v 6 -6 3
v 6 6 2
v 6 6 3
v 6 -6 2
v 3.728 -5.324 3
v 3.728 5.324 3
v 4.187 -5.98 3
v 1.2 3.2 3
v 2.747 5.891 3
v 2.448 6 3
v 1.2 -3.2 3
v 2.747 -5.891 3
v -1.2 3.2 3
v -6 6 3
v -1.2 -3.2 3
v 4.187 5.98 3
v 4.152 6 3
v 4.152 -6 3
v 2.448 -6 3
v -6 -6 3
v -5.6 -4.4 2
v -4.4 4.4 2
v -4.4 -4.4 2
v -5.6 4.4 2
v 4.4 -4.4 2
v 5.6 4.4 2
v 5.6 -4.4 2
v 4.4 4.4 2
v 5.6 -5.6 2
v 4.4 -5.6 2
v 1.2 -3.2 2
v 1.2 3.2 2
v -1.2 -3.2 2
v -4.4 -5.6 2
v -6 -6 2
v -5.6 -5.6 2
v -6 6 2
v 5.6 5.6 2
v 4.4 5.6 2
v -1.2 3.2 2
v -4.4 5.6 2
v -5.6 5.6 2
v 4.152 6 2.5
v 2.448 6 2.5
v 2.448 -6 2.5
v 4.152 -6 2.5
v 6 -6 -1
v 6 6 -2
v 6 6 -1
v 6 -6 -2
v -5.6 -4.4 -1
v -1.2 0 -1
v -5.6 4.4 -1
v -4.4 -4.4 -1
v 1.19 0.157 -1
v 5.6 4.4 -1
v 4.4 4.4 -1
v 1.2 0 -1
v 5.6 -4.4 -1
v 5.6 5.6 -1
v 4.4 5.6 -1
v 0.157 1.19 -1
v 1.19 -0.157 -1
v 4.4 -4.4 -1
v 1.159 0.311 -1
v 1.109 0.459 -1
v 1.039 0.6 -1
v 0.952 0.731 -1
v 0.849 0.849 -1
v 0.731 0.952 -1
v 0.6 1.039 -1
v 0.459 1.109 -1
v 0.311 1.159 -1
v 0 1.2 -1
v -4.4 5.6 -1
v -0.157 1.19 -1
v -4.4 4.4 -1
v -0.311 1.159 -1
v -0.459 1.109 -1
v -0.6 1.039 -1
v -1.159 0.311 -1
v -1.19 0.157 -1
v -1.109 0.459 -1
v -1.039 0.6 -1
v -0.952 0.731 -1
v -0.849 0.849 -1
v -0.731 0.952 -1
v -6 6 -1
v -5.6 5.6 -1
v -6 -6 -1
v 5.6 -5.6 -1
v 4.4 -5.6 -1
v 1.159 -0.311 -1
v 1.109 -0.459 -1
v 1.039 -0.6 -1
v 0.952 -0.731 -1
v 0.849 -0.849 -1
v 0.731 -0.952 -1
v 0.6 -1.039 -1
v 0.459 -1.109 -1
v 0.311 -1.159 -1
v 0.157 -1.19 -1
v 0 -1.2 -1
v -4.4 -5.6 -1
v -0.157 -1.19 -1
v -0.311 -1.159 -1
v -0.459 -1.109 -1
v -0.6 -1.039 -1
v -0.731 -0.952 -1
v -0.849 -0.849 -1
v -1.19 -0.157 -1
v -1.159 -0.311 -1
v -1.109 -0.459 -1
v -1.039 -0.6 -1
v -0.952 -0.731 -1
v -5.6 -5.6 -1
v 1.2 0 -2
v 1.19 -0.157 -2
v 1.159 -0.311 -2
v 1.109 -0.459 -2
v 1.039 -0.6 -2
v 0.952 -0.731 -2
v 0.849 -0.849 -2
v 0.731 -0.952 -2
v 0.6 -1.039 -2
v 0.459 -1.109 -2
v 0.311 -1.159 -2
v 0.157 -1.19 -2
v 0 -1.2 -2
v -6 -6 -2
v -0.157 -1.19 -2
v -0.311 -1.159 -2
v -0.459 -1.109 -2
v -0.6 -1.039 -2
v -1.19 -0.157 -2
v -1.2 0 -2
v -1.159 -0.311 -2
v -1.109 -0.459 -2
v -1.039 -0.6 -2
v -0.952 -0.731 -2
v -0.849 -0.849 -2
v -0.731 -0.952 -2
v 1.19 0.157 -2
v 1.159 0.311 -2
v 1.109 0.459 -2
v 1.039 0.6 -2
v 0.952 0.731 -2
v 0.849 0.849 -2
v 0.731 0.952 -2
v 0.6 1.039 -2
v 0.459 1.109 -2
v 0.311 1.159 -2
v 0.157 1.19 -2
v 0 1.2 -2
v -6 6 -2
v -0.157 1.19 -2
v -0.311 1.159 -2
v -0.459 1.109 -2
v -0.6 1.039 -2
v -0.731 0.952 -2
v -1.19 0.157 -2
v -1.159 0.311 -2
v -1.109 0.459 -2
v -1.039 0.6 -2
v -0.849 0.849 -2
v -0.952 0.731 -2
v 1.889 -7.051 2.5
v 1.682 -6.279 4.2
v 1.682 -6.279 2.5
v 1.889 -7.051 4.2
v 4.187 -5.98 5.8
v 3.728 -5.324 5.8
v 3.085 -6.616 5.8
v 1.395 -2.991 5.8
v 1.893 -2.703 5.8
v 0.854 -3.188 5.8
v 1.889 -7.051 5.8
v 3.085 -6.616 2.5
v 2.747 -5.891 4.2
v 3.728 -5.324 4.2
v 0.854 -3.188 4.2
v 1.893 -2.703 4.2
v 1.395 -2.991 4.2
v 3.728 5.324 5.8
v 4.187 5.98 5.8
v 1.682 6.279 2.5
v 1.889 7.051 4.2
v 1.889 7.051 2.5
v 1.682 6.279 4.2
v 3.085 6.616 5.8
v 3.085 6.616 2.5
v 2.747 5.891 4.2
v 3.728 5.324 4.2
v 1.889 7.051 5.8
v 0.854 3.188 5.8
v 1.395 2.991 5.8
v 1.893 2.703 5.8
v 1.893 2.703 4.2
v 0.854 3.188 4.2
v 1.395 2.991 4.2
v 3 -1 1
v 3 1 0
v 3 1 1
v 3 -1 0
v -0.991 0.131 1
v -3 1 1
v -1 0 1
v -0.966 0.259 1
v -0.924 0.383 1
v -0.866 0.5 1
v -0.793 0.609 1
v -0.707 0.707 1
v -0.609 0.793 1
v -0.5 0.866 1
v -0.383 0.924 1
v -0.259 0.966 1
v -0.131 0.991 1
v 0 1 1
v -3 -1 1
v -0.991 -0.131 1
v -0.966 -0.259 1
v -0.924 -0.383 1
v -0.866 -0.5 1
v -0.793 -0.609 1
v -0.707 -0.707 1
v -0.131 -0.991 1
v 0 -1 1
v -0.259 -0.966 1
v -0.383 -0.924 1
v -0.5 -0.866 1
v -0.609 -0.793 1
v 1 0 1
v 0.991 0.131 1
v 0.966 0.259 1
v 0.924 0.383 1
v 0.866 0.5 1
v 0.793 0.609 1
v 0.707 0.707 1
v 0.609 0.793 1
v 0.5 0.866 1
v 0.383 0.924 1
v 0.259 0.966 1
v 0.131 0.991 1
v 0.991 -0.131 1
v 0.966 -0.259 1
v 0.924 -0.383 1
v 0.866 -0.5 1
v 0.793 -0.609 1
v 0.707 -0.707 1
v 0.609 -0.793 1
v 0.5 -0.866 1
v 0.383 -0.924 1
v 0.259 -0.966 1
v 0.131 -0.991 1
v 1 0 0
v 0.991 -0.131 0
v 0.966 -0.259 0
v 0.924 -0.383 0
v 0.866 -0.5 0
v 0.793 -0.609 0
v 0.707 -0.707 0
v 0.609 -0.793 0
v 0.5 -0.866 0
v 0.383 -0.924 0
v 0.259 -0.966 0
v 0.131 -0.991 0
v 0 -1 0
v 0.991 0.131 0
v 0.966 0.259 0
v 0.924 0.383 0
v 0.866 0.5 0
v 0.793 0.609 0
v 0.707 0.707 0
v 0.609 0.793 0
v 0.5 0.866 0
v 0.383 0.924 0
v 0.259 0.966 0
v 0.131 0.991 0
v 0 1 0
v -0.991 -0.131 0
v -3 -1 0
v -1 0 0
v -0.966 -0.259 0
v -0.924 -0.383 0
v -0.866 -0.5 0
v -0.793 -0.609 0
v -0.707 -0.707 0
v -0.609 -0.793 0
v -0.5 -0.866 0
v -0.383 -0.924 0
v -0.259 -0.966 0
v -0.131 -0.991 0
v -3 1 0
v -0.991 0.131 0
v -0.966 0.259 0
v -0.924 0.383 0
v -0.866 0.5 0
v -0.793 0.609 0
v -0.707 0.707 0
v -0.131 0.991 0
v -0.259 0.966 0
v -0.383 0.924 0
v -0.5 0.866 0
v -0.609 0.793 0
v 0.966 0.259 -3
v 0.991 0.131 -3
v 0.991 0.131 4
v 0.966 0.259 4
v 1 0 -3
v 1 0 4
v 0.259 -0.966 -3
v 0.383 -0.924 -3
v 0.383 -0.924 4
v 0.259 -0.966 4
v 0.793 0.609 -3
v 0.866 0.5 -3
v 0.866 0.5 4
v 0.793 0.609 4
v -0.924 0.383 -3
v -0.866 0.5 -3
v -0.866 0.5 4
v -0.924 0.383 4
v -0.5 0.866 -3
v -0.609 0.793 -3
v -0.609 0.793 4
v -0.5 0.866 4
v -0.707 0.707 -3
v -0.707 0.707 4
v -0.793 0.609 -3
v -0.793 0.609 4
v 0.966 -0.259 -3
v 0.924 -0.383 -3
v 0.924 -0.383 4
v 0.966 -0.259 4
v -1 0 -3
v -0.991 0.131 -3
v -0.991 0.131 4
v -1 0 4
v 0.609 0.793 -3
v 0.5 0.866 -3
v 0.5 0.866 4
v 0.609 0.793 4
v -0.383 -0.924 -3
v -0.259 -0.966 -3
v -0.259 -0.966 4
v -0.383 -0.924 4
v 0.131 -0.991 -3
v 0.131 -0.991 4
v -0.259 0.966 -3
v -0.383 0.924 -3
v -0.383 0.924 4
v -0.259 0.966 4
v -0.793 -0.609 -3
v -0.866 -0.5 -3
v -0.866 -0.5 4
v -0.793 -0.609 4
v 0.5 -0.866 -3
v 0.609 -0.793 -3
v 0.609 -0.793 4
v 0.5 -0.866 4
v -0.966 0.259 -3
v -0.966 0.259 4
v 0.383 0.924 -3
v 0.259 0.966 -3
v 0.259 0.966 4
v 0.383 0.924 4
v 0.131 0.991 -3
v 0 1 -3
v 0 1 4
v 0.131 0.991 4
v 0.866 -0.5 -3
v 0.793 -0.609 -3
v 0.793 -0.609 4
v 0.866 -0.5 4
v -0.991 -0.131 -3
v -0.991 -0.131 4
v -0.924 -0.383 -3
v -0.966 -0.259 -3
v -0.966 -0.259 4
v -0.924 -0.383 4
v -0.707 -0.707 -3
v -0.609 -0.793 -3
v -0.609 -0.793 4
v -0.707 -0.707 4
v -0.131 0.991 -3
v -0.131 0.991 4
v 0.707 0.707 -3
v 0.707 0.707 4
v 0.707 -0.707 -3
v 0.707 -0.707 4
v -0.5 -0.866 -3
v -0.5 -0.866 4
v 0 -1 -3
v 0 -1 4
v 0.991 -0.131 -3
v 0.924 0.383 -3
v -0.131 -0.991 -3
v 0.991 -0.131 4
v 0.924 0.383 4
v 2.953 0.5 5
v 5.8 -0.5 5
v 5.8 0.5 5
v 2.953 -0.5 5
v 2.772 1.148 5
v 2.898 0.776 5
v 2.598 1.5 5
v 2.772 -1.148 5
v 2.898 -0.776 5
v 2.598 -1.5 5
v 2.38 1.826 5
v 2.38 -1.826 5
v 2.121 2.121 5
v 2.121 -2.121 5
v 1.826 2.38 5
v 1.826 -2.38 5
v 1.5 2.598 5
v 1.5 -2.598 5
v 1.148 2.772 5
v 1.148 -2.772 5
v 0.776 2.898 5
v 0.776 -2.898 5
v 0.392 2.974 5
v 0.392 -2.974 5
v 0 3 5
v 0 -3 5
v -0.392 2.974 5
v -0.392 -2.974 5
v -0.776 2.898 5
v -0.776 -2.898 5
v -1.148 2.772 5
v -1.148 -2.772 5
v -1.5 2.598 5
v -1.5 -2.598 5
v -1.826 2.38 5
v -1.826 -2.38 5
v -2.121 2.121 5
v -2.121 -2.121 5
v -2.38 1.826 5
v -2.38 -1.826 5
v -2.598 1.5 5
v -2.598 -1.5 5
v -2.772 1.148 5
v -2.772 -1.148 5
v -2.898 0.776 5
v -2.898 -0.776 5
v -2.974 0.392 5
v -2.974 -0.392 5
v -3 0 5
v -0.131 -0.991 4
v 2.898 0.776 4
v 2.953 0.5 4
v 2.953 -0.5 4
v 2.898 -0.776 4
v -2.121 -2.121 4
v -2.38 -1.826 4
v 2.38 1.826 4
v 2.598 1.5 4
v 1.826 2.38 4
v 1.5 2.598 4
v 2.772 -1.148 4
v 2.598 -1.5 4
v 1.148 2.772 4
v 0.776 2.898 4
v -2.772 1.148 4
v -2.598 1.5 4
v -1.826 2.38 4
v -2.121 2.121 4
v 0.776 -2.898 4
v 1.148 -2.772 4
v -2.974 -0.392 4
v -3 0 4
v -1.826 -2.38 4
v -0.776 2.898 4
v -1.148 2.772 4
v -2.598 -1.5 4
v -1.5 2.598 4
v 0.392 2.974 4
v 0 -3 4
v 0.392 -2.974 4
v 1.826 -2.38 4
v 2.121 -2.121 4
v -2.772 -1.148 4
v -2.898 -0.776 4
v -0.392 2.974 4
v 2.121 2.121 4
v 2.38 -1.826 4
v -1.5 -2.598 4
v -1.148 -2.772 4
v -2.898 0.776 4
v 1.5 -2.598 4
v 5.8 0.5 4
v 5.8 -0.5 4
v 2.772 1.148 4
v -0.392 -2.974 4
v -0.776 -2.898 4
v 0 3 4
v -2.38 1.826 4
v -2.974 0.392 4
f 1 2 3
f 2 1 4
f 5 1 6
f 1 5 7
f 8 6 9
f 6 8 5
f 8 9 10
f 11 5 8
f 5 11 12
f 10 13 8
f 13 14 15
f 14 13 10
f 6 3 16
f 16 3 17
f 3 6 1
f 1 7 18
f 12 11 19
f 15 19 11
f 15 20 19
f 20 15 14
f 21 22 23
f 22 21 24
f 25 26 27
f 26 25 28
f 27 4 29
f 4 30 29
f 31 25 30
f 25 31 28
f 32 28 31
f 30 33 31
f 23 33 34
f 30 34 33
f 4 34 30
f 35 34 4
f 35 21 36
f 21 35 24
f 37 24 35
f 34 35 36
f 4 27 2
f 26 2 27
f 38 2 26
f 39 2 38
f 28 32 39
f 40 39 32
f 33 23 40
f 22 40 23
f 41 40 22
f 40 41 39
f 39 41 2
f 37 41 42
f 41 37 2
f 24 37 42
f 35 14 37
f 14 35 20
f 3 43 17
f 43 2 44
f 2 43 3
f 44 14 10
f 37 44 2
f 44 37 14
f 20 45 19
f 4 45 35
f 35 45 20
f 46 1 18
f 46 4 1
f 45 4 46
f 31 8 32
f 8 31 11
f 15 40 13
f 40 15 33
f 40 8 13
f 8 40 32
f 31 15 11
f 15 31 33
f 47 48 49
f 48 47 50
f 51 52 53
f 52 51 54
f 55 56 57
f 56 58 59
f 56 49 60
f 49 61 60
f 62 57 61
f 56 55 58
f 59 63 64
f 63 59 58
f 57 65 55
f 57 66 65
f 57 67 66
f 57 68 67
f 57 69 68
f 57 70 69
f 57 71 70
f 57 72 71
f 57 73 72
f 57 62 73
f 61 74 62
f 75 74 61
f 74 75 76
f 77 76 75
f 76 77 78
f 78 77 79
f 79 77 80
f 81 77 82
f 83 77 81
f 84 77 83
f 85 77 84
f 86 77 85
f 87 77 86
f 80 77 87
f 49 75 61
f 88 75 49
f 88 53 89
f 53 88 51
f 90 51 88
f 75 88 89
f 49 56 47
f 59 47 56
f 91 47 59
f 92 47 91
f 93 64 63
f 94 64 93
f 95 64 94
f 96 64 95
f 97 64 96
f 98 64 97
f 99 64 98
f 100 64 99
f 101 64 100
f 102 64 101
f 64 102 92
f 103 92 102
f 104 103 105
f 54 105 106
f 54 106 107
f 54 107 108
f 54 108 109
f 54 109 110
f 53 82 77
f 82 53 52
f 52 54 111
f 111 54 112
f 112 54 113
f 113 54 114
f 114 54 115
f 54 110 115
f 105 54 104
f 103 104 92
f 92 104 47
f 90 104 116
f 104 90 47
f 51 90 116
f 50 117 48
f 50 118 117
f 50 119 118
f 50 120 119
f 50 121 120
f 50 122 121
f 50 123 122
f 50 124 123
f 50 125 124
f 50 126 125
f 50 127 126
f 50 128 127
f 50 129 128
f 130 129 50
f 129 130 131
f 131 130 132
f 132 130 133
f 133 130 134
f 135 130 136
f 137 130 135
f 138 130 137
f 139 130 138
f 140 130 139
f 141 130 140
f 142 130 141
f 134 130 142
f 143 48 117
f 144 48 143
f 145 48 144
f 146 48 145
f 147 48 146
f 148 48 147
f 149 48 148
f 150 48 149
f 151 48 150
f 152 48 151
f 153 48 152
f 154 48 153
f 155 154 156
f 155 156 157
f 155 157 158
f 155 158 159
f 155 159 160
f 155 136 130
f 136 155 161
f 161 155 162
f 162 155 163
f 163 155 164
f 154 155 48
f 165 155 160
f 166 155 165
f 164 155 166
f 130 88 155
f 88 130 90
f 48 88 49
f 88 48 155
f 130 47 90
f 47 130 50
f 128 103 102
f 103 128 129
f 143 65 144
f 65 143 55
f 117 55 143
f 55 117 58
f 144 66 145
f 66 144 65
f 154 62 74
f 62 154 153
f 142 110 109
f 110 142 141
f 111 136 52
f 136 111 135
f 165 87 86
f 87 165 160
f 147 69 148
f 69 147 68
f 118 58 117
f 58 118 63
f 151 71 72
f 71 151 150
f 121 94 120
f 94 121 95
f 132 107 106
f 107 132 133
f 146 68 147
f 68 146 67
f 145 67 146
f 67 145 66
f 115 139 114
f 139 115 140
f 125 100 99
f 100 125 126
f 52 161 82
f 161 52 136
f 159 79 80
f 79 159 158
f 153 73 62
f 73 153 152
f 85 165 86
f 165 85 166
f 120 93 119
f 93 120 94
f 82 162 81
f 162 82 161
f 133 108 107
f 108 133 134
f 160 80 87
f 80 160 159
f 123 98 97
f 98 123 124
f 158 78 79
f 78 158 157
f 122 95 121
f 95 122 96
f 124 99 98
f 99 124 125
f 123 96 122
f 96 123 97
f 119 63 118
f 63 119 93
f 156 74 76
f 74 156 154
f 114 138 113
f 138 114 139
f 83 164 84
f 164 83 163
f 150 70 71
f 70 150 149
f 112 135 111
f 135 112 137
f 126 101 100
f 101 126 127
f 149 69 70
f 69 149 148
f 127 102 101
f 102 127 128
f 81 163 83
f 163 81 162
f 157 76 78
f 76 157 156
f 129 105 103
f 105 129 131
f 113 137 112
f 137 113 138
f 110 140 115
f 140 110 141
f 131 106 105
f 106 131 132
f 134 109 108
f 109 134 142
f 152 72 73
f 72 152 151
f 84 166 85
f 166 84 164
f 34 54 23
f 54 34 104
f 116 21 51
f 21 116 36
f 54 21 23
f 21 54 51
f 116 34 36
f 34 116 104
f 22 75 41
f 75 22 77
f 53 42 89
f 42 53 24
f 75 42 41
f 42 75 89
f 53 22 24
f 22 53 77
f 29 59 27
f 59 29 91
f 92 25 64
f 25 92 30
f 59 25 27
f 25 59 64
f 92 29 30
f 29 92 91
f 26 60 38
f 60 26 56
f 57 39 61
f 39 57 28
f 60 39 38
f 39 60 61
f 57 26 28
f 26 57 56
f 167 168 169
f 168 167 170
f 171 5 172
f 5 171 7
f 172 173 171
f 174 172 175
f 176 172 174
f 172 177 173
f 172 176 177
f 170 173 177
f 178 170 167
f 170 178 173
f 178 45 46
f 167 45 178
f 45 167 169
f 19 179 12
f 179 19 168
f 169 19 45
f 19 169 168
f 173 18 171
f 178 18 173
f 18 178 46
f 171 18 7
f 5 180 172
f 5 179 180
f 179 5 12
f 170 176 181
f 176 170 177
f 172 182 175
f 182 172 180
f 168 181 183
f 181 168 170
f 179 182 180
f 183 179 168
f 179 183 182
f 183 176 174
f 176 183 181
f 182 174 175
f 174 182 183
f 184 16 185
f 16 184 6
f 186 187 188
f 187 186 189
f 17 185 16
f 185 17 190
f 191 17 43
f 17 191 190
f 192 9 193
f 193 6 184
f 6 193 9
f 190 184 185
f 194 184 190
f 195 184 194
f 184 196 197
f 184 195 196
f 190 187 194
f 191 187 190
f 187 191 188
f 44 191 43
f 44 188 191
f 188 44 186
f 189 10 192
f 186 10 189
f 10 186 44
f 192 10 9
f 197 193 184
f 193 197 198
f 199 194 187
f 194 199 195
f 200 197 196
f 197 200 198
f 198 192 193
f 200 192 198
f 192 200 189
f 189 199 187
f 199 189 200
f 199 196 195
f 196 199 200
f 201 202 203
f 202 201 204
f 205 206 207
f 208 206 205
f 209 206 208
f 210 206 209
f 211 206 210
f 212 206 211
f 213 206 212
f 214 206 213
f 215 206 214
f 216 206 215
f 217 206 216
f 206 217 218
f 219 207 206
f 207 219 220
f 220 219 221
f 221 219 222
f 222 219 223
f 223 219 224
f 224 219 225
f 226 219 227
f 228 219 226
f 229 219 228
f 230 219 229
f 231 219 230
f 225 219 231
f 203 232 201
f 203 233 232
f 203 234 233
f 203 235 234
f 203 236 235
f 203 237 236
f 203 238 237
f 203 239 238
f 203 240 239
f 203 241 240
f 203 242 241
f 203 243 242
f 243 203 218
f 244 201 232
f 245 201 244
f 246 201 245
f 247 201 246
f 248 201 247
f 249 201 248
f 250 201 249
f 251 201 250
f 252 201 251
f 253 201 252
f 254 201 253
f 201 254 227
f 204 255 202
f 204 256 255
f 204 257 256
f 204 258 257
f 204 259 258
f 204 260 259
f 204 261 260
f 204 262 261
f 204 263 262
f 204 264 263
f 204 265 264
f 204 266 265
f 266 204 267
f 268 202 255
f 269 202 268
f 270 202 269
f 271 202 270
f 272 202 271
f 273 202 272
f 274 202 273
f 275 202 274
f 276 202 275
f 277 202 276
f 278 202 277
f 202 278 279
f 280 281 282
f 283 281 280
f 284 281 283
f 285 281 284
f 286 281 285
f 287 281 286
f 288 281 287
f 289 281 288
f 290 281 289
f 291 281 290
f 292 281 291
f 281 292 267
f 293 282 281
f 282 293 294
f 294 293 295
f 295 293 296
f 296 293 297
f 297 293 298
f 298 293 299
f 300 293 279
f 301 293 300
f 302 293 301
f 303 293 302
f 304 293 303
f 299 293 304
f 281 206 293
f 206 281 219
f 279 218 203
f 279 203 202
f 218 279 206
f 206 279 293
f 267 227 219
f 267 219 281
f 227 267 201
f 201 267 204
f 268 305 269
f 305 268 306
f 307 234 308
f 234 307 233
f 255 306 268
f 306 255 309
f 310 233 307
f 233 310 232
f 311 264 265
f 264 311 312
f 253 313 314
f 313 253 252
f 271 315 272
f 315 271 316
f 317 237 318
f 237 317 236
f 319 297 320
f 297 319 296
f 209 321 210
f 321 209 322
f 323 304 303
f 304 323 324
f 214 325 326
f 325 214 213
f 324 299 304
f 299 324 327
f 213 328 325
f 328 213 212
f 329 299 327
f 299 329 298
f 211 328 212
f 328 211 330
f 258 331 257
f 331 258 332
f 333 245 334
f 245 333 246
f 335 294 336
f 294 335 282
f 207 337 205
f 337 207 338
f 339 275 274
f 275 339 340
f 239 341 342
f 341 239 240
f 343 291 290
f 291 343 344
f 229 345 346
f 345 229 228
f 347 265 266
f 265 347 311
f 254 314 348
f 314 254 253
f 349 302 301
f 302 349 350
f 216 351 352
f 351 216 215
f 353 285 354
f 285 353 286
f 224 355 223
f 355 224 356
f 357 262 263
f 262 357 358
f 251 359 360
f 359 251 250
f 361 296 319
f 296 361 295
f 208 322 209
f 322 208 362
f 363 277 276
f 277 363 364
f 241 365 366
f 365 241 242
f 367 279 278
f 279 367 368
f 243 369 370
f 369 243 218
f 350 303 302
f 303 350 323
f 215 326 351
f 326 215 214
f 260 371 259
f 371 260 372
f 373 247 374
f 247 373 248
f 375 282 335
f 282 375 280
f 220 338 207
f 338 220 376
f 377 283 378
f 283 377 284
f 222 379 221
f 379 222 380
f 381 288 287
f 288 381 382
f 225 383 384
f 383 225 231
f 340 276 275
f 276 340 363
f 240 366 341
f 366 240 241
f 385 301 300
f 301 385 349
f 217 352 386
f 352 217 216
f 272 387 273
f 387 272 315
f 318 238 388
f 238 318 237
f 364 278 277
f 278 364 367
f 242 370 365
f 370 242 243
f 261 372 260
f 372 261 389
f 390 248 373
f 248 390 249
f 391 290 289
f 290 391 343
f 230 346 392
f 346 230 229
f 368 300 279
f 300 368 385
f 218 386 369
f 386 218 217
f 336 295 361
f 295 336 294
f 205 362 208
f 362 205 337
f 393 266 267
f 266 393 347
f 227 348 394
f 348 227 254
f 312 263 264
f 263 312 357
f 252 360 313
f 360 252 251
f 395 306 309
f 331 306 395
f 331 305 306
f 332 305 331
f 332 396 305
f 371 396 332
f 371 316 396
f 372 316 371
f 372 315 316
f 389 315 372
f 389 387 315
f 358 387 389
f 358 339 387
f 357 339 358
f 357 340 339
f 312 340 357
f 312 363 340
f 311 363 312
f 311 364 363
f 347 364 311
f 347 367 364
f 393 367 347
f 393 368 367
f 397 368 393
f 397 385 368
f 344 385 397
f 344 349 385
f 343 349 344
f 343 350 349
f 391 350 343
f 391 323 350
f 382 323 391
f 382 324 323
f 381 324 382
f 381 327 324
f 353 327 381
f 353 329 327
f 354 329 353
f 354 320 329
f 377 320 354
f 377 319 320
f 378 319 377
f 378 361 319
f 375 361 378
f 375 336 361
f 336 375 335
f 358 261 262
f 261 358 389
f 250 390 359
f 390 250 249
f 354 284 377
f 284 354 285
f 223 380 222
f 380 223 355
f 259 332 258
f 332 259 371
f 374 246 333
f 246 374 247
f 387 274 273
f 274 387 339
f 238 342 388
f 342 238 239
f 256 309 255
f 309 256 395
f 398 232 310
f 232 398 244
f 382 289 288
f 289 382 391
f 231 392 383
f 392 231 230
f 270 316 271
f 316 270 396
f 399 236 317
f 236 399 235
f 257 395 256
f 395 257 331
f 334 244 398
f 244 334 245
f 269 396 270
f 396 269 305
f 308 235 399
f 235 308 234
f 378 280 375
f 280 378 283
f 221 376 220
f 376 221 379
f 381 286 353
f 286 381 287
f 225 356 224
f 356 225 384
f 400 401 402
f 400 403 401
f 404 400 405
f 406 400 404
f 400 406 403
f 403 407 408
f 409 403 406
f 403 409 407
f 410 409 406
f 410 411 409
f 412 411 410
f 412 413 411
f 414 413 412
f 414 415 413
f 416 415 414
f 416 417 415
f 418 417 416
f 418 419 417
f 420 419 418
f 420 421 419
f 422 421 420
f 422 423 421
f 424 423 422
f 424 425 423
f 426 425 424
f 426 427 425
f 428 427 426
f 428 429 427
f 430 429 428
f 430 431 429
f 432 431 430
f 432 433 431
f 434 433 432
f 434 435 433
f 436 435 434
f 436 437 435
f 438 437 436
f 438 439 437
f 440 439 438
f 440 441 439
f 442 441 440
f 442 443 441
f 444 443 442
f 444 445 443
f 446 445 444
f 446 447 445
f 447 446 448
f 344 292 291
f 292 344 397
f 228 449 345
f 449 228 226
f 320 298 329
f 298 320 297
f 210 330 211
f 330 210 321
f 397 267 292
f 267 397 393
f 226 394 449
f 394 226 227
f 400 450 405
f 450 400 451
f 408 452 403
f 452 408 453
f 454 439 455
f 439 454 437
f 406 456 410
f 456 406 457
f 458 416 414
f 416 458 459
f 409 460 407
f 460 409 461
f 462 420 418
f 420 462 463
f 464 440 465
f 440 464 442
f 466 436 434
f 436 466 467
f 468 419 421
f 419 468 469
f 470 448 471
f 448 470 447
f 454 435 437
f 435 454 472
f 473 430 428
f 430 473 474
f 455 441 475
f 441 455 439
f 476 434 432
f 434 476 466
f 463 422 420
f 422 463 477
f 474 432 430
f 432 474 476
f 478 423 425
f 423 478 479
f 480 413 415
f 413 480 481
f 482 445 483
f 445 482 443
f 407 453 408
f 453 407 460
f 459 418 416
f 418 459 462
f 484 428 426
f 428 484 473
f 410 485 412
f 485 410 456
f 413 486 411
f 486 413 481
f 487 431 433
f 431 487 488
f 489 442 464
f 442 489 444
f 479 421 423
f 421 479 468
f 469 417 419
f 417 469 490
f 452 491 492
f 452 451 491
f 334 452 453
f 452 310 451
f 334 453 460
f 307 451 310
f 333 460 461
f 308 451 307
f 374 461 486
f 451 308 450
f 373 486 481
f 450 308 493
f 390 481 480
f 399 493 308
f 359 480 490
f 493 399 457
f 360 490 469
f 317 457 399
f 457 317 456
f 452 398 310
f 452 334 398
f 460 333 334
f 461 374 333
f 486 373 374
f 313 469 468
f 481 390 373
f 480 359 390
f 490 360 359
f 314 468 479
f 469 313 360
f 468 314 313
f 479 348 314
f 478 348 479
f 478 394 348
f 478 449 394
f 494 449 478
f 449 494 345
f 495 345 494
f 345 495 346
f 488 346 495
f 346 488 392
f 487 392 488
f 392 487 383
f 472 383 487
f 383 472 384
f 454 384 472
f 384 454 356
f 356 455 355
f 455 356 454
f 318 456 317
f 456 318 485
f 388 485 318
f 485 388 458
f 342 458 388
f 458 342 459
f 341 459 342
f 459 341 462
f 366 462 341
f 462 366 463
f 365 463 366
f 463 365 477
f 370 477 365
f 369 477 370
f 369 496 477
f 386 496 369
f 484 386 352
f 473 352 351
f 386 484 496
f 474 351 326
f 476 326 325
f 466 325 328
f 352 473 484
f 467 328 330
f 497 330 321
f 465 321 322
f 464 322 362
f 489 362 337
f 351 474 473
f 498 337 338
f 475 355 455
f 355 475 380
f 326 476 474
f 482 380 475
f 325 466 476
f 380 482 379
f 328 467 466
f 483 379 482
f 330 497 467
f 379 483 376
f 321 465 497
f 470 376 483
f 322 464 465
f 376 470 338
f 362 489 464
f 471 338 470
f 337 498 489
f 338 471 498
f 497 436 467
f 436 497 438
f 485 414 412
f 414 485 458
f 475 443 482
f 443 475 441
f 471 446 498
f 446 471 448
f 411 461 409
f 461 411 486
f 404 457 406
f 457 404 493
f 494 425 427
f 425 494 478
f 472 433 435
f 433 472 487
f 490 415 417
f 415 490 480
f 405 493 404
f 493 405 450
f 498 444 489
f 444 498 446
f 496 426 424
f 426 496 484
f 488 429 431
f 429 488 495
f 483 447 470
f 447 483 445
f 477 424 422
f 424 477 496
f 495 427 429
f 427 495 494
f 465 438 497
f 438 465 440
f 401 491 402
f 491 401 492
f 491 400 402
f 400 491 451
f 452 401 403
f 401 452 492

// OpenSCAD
// Original two-body digital experiment. Dimensions in mm.
// Service -45..45 deg at axial_shift=0. Proposed release: lower 0.9,
// rotate 90, then raise to axial_shift=10. No force or intent guarantee.
agentscad_part = "all";
service_angle = 0;
axial_shift = 0;
$fn = 48;

module annular_sector(inner_radius, outer_radius, begin_angle, end_angle, bottom, height) {
    translate([0,0,bottom])
        rotate([0,0,begin_angle])
            rotate_extrude(angle=end_angle-begin_angle)
                translate([inner_radius,0]) square([outer_radius-inner_radius,height]);
}

module support() {
    union() {
        difference() {
            translate([-6,-6,2]) cube([12,12,1]);
            translate([-1.2,-3.2,1.9]) cube([2.4,6.4,1.2]);
        }
        difference() {
            translate([-6,-6,-2]) cube([12,12,1]);
            translate([0,0,-2.1]) cylinder(d=2.4,h=1.2);
        }
        for (x=[-5,5], y=[-5,5])
            translate([x-0.6,y-0.6,-1.2]) cube([1.2,1.2,3.5]);
        for (side=[-1,1]) {
            begin_angle = side > 0 ? 55 : -75;
            end_angle = side > 0 ? 75 : -55;
            annular_sector(6.5,7.3,begin_angle,end_angle,2.5,3.3);
            annular_sector(3.3,7.3,begin_angle,end_angle,4.2,1.6);
        }
    }
}

module rotor() {
    union() {
        translate([-3,-1,0]) cube([6,2,1]);
        translate([0,0,-3]) cylinder(d=2,h=8);
        translate([0,0,4]) cylinder(d=6,h=1);
        translate([0,-0.5,4]) cube([5.8,1,1]);
    }
}

// Pose view is separate from the two local manufacturing selectors.
module posed_rotor() {
    translate([0,0,axial_shift]) rotate([0,0,service_angle]) rotor();
}

if (agentscad_part == "support") support();
else if (agentscad_part == "rotor") rotor();
else if (agentscad_part == "rotor_pose") posed_rotor();
else {
    support();
    posed_rotor();
}
